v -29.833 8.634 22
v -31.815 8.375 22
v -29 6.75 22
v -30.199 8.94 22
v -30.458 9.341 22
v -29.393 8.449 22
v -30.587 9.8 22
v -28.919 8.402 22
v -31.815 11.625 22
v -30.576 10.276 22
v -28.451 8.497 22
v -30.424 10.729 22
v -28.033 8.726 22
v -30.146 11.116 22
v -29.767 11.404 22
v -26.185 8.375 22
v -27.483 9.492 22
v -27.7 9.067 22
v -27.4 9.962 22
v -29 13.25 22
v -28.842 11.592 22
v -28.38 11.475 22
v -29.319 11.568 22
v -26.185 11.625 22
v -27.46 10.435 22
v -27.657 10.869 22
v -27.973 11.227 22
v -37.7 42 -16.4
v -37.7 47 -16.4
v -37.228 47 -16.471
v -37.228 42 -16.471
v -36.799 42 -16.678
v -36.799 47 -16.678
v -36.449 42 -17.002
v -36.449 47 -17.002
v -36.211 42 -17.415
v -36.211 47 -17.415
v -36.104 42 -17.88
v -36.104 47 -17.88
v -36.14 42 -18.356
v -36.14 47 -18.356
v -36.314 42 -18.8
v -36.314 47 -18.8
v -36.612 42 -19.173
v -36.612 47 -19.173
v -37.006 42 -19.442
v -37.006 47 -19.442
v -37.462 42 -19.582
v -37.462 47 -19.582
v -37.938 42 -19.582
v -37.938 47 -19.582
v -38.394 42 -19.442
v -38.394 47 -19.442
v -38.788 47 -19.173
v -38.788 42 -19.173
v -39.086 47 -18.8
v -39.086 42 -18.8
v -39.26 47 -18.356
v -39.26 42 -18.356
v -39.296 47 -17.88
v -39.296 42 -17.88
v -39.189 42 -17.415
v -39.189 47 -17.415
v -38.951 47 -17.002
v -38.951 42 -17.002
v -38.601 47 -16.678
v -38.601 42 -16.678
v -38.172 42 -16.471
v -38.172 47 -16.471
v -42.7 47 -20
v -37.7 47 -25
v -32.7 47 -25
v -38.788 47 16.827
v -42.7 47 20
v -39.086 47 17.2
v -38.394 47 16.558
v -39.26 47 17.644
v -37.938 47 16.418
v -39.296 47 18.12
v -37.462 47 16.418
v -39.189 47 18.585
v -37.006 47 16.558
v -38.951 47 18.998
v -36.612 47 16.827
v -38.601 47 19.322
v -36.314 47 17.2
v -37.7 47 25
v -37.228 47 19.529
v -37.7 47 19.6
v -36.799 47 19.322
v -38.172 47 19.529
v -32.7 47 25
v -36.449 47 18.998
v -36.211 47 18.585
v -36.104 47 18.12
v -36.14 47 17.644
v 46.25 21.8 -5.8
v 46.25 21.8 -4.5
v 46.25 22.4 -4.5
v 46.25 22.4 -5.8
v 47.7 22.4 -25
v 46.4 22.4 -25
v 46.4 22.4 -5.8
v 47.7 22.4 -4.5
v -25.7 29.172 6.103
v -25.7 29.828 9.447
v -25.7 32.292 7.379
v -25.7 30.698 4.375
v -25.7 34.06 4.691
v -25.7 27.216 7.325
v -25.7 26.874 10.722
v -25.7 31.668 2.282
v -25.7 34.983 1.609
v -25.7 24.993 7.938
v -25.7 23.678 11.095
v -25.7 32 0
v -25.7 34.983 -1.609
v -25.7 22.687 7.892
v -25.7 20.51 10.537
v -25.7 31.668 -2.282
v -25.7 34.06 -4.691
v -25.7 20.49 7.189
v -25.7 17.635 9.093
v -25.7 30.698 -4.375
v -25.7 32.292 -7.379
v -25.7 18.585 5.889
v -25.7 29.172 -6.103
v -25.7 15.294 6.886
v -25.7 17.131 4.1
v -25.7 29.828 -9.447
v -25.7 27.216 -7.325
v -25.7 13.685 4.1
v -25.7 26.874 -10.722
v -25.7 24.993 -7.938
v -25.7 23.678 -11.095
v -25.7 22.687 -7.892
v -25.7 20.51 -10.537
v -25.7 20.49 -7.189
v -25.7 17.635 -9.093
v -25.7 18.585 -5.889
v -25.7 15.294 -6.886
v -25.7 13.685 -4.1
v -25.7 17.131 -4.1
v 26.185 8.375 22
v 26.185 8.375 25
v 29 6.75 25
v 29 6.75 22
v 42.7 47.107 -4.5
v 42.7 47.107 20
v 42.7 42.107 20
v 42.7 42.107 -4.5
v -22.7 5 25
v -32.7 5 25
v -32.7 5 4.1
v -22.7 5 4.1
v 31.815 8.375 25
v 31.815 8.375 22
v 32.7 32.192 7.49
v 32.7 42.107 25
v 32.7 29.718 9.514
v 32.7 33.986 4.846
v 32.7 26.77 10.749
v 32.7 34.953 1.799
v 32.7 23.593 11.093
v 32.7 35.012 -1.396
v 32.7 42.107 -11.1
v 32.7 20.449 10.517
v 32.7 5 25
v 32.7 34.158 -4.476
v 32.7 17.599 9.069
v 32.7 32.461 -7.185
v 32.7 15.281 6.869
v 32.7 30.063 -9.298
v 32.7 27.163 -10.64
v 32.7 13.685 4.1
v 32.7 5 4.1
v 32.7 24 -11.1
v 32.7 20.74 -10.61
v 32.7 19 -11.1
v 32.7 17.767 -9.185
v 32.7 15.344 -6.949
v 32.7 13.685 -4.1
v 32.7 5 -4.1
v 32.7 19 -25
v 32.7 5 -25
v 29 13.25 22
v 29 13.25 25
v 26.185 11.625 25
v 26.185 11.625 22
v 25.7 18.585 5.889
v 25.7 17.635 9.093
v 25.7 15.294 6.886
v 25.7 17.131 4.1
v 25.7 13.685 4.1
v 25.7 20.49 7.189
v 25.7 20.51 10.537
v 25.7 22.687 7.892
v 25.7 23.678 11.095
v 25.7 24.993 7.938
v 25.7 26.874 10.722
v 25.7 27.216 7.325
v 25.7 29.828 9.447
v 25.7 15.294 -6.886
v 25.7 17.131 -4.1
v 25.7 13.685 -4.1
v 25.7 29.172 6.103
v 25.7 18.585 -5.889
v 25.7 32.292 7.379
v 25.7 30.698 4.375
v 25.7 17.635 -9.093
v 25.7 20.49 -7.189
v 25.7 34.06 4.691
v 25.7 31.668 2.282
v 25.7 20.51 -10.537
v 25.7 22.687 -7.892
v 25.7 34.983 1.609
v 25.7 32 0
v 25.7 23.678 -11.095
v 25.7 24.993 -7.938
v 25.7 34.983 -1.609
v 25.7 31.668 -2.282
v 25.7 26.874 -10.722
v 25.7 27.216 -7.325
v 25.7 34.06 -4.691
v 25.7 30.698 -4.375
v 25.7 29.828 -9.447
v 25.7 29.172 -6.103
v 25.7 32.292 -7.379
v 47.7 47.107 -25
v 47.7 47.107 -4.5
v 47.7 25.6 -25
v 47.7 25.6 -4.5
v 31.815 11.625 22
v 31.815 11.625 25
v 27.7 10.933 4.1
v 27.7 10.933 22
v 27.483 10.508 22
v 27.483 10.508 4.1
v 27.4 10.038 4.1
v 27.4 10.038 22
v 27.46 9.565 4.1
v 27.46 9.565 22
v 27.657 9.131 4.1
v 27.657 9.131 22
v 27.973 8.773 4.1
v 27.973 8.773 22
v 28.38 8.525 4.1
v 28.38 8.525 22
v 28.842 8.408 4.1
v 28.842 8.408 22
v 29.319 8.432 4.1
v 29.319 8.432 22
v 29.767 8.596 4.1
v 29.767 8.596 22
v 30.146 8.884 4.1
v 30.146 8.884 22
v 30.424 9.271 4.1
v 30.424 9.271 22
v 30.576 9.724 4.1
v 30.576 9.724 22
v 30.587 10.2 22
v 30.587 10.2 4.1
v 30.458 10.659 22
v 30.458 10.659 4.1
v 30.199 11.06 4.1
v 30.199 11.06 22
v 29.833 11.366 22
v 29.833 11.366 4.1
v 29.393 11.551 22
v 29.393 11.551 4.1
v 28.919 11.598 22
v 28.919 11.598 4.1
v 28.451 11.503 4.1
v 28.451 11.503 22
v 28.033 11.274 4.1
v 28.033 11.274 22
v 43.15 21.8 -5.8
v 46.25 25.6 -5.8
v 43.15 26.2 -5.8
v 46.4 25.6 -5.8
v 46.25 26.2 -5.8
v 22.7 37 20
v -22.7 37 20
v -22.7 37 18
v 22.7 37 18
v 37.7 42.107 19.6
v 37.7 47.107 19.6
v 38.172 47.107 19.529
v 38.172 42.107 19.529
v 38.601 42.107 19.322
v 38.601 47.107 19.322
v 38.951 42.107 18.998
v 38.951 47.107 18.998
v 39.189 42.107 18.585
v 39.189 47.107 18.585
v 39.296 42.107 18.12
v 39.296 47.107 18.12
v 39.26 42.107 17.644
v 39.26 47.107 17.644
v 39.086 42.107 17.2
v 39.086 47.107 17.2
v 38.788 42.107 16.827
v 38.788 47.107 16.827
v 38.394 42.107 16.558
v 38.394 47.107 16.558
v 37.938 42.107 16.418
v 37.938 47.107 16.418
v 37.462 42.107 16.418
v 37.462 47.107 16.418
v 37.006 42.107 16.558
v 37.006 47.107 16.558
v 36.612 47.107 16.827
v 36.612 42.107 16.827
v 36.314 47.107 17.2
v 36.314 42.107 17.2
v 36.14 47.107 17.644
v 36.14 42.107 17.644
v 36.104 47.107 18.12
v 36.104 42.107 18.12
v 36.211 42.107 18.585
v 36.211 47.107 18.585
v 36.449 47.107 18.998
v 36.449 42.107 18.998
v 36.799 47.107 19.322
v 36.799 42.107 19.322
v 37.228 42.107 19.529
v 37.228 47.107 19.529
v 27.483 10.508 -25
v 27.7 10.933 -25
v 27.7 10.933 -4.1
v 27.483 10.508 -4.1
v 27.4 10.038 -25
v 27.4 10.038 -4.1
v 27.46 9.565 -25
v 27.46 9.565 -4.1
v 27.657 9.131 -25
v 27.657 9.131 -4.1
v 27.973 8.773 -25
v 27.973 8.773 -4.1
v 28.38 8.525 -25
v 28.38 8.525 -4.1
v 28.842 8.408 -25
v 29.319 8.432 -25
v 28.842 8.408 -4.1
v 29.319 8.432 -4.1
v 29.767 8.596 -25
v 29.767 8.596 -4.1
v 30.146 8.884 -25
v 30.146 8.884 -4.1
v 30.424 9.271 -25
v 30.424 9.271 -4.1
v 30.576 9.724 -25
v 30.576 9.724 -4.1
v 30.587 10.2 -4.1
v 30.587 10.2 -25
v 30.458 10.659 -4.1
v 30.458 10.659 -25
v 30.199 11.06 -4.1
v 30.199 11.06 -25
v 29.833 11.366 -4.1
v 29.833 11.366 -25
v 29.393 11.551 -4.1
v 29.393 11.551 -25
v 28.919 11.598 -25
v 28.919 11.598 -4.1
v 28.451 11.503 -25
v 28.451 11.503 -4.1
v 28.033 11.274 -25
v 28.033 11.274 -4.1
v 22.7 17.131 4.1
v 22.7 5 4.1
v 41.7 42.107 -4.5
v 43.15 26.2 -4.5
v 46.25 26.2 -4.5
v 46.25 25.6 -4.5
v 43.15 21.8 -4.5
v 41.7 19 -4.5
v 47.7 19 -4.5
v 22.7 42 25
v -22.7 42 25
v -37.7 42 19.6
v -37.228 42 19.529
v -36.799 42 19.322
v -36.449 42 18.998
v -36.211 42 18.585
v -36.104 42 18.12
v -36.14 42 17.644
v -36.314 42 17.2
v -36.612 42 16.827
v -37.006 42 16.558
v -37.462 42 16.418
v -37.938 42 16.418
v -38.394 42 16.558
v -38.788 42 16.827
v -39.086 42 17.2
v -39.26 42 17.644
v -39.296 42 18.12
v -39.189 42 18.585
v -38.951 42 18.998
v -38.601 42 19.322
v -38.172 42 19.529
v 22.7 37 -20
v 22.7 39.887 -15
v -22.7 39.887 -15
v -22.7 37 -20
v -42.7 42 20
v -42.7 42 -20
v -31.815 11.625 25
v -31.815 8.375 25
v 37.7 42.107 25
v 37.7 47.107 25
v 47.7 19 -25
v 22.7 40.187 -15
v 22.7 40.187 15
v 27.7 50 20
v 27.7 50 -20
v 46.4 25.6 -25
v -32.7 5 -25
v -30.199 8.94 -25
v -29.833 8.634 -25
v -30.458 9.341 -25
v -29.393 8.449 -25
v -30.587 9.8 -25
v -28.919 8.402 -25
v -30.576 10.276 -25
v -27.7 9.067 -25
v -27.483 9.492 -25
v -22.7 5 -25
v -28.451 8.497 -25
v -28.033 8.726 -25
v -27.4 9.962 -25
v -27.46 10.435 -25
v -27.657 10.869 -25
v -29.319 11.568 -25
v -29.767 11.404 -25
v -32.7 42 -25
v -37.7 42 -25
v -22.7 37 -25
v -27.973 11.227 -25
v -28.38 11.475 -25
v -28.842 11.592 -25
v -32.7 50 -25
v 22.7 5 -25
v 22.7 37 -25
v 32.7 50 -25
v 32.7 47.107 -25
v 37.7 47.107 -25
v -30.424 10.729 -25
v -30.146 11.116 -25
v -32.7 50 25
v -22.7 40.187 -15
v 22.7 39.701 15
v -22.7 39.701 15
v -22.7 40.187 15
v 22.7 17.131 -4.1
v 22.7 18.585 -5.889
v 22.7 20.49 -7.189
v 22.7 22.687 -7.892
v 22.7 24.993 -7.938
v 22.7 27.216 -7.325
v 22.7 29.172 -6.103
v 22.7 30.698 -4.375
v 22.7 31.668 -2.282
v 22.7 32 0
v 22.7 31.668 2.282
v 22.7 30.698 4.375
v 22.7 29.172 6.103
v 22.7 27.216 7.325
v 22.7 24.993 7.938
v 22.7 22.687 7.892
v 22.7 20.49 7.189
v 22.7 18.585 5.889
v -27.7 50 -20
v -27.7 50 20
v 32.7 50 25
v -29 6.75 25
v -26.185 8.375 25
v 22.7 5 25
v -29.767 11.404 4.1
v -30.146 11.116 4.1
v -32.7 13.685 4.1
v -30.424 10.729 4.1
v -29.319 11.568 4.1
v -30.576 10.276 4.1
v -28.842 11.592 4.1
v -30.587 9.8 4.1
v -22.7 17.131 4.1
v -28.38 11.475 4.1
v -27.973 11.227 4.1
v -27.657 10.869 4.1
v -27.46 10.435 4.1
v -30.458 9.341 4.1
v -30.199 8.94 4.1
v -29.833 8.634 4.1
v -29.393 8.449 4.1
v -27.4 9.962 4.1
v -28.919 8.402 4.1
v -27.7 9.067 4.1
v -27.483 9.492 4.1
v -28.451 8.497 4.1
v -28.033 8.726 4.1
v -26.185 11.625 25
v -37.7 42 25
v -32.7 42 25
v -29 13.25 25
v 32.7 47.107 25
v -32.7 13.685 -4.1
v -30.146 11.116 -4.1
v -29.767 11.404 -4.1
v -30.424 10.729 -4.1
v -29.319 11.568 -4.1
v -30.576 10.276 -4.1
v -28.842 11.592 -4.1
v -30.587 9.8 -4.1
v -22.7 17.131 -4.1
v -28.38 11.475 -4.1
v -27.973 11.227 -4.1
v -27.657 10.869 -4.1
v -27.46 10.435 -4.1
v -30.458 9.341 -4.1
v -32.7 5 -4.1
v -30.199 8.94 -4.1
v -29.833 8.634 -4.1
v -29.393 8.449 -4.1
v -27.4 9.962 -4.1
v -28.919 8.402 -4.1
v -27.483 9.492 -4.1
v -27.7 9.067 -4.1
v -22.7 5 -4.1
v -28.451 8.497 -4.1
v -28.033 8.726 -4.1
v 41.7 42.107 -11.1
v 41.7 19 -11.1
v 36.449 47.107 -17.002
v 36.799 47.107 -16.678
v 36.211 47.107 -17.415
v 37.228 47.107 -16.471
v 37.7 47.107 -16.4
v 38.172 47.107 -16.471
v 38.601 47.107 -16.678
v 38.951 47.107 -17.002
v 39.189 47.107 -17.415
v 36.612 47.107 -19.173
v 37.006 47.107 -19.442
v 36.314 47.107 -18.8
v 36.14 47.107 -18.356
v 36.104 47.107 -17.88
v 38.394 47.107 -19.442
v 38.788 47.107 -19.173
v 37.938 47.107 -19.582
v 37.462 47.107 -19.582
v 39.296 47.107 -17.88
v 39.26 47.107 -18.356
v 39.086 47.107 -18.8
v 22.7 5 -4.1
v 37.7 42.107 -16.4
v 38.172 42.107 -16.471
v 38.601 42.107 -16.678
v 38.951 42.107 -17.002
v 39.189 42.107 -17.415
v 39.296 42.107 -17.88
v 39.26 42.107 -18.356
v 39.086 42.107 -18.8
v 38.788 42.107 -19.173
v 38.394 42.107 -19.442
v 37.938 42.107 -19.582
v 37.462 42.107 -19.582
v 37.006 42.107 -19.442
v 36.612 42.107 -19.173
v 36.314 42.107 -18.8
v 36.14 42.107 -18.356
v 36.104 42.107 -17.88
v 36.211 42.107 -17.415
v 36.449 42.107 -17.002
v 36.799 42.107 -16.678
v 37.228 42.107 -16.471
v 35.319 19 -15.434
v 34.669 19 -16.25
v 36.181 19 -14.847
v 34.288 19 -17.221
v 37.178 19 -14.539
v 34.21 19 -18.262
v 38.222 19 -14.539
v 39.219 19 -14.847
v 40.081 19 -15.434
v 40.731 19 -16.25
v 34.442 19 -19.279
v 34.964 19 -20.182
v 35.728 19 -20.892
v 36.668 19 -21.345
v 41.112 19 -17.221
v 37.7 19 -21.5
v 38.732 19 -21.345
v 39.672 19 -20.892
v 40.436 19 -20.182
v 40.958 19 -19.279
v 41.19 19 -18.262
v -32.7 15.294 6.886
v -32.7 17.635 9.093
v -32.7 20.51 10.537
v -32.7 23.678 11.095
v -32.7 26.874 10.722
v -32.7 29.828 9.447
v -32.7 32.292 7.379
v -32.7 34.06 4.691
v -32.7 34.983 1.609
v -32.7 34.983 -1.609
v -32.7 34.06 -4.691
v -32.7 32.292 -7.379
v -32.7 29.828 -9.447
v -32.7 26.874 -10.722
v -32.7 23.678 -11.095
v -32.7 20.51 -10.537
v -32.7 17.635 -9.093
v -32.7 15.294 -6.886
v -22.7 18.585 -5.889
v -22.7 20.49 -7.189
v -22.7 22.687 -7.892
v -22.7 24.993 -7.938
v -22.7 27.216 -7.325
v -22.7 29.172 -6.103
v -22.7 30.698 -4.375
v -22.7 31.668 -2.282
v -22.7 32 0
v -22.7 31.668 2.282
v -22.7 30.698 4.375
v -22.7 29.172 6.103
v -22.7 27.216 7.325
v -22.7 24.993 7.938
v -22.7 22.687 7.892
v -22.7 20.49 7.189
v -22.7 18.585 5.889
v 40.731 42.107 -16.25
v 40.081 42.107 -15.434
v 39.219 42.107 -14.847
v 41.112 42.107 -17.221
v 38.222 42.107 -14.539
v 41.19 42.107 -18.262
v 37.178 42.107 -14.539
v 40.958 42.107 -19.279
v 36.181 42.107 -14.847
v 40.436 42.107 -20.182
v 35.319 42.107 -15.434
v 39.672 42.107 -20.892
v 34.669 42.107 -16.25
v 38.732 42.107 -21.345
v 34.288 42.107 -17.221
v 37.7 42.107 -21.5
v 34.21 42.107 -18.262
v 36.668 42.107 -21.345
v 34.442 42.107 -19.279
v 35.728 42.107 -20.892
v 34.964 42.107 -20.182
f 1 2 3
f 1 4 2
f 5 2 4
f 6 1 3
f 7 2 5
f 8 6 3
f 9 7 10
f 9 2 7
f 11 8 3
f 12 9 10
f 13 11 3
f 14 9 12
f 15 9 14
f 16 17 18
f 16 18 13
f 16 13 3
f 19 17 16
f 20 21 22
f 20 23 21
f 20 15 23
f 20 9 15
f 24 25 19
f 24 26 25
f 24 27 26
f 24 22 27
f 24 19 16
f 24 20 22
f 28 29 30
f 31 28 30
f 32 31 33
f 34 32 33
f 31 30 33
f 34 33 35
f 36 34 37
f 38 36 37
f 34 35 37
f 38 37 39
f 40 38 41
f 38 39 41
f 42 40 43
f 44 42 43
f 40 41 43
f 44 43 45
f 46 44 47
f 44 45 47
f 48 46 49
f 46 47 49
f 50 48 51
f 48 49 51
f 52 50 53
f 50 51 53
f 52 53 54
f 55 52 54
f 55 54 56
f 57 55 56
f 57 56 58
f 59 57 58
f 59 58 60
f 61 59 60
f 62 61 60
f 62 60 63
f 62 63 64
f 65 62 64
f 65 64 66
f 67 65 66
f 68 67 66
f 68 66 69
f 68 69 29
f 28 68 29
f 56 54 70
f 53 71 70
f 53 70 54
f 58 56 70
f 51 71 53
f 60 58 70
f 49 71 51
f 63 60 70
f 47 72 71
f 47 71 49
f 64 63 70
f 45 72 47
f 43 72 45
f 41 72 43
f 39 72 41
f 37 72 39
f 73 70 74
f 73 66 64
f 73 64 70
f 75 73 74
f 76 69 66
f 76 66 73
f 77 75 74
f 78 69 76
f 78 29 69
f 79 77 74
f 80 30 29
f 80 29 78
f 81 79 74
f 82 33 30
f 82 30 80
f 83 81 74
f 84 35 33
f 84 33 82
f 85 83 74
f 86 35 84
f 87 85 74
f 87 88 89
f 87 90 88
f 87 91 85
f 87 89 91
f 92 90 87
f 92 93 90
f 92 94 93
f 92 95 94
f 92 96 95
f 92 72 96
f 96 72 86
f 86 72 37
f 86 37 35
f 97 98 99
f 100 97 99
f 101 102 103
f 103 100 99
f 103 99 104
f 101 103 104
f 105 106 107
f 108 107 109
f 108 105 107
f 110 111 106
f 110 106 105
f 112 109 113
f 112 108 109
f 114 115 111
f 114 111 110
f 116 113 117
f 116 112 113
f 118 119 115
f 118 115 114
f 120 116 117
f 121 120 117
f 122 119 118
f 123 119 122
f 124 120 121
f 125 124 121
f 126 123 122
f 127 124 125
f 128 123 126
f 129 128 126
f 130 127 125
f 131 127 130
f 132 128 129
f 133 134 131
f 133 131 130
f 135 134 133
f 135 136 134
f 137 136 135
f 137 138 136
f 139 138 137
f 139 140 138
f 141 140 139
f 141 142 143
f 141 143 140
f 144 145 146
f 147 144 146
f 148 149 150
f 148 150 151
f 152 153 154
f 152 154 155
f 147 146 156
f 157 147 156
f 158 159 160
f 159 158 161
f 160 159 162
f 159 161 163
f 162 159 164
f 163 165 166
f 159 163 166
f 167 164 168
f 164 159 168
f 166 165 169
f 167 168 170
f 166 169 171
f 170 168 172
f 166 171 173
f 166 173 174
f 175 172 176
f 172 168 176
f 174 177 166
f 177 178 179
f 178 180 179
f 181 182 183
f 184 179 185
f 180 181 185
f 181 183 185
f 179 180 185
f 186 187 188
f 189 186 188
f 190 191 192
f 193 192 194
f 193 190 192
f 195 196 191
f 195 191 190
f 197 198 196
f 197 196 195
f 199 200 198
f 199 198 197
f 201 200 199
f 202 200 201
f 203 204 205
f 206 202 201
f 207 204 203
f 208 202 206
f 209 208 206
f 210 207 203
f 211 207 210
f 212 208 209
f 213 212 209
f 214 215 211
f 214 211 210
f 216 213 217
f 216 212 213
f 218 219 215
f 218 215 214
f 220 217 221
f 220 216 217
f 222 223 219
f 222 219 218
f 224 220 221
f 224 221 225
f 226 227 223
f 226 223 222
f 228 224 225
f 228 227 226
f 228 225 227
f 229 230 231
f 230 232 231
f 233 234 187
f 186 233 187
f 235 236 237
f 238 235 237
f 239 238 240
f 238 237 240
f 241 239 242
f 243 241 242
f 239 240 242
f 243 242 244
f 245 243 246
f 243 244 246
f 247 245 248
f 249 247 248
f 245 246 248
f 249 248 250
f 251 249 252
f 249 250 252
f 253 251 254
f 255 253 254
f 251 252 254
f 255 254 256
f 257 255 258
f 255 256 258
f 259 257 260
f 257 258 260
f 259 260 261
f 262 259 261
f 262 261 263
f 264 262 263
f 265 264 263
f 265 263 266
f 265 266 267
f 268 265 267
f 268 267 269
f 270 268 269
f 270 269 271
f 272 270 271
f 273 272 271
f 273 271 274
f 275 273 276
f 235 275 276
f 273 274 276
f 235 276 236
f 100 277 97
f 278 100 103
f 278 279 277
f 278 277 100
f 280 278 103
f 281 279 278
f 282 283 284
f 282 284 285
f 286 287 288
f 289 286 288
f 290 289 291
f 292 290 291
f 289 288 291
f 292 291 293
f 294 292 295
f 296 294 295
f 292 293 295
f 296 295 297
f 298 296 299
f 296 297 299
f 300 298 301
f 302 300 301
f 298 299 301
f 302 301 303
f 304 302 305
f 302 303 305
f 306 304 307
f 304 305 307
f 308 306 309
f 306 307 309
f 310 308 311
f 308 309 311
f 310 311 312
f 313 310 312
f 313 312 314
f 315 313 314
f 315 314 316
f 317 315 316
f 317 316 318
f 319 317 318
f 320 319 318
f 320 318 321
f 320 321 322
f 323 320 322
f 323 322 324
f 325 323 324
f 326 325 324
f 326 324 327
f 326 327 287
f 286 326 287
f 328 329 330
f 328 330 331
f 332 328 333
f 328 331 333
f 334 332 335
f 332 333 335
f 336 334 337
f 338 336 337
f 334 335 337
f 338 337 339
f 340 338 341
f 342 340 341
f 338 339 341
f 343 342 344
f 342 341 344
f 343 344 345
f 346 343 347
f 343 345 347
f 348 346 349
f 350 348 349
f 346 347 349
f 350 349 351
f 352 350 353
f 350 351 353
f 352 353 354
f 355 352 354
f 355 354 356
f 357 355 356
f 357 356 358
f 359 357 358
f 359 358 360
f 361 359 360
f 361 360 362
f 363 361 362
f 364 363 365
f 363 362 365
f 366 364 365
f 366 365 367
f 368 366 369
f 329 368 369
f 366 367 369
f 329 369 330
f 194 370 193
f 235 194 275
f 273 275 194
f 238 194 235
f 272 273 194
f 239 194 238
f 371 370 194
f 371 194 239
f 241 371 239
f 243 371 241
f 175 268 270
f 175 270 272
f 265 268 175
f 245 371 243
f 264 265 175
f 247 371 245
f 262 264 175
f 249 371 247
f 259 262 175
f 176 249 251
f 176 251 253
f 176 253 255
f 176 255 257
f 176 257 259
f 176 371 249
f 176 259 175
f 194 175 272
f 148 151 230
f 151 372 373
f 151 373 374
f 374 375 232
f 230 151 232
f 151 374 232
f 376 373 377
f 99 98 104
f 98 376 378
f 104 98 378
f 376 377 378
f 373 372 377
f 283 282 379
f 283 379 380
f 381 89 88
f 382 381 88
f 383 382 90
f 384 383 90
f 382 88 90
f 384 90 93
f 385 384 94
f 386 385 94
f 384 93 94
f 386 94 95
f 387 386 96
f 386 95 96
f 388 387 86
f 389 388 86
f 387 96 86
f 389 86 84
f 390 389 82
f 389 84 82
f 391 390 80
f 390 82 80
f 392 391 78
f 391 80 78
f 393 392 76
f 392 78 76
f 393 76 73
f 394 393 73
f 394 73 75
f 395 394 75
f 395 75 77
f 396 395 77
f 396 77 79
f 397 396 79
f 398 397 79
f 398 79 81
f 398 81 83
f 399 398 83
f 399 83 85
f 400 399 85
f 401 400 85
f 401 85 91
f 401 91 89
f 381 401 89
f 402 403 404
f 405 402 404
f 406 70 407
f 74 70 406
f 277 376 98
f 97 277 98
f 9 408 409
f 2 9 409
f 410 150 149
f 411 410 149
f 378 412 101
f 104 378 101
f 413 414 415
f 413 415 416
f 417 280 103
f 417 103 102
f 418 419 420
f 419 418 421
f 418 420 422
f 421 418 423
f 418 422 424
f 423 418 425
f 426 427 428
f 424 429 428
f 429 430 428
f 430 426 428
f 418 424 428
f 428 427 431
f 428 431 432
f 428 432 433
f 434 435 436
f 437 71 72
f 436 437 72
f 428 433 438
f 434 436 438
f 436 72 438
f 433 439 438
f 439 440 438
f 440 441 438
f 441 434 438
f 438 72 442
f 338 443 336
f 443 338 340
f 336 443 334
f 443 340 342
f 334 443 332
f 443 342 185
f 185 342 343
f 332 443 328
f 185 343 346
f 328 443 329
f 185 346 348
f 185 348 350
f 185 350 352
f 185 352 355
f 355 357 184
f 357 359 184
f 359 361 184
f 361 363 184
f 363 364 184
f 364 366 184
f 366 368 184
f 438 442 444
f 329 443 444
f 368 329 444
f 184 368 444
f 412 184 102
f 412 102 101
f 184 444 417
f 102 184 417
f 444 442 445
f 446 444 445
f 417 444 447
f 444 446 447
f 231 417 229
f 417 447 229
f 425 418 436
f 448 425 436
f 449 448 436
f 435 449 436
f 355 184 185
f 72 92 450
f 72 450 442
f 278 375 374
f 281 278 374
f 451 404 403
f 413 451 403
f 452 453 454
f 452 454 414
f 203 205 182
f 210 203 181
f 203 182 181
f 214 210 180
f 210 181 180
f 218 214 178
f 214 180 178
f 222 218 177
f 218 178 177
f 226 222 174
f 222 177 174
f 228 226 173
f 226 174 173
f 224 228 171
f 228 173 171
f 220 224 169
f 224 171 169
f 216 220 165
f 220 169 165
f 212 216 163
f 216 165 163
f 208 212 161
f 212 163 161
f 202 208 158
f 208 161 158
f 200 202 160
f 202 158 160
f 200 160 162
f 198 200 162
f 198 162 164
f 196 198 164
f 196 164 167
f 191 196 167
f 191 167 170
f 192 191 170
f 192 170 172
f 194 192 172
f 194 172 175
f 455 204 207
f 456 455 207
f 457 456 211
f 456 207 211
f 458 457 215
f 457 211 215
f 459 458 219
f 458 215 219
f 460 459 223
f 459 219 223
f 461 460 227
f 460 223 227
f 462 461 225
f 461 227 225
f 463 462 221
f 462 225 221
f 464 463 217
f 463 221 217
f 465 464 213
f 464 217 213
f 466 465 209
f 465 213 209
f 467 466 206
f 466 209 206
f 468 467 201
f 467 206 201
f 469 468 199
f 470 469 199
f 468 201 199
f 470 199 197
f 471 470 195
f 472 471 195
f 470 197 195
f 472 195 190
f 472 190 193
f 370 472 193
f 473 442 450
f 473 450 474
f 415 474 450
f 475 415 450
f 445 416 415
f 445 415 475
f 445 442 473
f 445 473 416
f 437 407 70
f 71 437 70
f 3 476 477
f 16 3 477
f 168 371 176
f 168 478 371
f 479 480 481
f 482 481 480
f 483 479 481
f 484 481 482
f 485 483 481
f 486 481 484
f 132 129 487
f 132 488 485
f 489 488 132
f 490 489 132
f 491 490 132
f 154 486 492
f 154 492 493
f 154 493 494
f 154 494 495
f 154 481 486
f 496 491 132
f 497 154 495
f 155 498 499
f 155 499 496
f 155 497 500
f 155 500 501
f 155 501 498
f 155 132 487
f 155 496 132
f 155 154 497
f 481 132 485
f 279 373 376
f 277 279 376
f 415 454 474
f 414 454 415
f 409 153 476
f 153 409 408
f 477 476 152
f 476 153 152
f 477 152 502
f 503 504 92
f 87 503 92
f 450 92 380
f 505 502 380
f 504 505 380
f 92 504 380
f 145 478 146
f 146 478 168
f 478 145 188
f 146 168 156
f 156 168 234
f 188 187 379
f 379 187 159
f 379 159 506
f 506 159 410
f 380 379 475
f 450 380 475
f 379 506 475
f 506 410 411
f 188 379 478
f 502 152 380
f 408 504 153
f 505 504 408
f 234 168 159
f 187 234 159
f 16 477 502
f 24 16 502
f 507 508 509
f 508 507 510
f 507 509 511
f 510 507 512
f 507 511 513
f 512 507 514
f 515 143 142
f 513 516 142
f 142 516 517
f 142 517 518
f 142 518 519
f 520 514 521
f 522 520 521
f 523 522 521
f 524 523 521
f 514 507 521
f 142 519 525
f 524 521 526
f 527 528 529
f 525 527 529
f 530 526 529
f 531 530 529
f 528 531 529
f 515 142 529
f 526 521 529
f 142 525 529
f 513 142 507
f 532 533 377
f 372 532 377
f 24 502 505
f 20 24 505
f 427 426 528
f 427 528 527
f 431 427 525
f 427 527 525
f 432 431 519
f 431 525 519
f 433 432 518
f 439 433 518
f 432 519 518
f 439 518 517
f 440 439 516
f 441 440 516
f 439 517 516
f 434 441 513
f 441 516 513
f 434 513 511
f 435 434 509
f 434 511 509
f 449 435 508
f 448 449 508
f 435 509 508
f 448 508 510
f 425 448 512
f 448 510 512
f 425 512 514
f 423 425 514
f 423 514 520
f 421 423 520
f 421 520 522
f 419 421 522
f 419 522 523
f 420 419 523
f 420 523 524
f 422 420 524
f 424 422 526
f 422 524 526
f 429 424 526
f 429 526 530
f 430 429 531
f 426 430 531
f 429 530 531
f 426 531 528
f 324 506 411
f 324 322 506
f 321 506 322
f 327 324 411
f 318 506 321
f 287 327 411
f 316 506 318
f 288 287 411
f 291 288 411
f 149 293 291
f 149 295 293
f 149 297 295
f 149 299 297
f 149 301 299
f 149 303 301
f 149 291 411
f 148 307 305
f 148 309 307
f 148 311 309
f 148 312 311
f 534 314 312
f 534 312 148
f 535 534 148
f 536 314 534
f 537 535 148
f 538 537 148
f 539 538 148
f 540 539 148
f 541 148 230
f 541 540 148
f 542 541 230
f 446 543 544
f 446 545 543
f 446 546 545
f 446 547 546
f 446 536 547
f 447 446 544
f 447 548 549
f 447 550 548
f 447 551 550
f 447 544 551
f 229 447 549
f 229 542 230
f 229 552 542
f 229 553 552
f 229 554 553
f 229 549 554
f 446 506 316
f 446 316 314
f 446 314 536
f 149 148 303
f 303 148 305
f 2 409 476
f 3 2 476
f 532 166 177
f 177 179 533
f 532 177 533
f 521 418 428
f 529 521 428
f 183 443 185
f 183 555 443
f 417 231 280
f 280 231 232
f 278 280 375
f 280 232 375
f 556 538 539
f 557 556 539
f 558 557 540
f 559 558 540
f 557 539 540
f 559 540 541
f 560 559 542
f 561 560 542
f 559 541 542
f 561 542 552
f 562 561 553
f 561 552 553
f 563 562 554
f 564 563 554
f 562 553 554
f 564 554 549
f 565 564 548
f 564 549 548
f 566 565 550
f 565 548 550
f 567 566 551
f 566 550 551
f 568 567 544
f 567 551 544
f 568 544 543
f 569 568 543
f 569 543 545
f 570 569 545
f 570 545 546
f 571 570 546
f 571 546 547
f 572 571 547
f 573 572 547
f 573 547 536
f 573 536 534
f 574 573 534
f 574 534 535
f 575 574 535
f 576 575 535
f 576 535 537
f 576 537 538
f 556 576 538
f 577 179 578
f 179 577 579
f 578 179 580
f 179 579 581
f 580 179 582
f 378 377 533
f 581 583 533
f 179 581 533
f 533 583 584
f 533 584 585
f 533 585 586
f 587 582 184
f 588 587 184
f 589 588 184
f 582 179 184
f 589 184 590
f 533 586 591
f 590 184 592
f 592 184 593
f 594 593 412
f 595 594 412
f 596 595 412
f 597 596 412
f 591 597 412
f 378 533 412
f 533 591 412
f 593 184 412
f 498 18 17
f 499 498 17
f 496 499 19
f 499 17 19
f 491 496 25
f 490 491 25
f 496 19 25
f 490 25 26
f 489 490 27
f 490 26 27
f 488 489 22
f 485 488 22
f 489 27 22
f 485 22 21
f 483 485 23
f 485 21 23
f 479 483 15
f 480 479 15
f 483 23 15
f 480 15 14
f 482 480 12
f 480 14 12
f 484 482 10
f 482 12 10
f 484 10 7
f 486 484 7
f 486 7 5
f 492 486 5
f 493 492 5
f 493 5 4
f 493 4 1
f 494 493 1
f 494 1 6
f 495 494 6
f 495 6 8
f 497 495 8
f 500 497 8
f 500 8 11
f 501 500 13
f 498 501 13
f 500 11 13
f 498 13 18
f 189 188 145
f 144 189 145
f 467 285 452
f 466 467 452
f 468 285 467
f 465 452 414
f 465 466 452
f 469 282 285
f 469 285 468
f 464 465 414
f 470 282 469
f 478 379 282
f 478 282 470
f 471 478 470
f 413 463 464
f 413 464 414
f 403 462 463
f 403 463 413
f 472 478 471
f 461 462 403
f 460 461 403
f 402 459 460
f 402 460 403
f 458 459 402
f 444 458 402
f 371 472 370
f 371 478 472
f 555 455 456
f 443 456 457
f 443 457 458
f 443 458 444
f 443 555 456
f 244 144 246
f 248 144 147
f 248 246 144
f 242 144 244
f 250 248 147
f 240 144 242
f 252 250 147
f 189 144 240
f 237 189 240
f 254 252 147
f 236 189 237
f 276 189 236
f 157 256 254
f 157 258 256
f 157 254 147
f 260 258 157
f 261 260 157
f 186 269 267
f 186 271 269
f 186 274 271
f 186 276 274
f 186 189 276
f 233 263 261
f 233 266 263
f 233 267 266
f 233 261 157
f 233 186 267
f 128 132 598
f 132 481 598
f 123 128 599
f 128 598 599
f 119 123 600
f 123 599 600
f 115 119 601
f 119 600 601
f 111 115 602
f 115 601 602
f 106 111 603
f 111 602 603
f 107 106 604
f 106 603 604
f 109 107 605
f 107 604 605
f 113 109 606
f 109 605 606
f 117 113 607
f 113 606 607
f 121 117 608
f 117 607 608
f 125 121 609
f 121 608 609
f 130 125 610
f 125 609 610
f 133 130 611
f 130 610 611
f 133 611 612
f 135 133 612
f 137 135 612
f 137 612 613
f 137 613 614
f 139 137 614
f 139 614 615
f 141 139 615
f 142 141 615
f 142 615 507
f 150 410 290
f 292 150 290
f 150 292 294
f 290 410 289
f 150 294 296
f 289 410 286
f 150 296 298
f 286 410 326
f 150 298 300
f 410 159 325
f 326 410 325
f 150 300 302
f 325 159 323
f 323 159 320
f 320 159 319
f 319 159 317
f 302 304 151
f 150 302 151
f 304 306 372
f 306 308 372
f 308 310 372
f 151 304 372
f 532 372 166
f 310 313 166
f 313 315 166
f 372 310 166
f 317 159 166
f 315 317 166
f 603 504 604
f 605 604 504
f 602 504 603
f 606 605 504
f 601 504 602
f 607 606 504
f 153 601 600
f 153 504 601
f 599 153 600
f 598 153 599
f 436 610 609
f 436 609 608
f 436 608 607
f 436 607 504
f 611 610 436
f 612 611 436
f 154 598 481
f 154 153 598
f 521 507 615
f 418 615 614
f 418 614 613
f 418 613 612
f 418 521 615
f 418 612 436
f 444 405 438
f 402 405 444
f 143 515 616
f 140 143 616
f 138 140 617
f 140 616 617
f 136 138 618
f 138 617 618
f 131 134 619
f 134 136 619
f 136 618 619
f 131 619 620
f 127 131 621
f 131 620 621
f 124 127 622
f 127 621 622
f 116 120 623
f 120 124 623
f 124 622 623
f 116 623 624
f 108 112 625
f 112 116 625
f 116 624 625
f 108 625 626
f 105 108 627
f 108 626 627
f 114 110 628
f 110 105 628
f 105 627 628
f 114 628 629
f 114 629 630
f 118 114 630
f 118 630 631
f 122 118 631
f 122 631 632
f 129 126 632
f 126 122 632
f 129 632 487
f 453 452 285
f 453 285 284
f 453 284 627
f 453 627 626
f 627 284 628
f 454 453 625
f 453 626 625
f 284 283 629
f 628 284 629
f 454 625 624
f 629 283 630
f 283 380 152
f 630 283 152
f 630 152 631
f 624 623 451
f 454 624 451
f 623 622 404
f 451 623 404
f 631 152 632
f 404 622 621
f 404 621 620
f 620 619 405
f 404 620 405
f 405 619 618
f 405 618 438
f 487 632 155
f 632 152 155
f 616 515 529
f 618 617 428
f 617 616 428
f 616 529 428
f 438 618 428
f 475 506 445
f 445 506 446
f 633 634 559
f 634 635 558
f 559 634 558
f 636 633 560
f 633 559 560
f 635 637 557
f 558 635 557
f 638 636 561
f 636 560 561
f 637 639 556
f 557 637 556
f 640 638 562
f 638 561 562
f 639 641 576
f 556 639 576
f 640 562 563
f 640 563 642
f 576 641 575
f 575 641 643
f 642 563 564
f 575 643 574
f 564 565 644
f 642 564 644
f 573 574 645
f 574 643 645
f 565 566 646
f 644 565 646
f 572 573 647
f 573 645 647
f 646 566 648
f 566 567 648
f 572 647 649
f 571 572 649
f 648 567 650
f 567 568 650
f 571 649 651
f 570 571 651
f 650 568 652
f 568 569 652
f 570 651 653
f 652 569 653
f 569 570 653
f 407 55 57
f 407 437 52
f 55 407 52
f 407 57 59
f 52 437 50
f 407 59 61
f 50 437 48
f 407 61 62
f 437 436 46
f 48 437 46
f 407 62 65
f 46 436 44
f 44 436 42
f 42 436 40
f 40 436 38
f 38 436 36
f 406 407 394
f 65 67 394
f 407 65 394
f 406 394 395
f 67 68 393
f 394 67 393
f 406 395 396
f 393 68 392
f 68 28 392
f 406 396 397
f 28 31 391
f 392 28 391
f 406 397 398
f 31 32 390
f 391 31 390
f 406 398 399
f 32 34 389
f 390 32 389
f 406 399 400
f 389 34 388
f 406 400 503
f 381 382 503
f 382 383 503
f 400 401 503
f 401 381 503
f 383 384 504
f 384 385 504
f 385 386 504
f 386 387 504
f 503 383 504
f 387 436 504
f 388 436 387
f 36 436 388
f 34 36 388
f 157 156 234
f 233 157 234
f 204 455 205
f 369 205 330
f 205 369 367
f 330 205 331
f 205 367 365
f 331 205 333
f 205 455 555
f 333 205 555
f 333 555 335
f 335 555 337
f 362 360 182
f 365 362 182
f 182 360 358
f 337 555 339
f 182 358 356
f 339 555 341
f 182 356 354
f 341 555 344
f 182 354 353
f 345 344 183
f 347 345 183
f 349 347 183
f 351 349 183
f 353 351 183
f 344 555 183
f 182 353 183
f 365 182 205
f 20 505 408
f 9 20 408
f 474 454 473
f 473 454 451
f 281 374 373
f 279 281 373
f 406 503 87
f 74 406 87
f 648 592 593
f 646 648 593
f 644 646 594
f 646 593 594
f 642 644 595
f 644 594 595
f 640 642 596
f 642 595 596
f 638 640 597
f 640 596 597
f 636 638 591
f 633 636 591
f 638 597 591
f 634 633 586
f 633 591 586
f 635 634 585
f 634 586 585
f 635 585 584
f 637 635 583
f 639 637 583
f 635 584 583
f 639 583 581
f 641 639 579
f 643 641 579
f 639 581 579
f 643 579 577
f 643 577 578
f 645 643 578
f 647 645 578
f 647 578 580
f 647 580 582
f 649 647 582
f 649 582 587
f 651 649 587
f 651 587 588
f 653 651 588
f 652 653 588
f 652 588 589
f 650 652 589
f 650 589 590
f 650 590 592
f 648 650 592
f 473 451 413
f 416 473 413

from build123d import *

# Parameters (mm, degrees)
SKETCH1_W           = 65.4
SKETCH1_H           = 60
SKETCH1_W_2         = 45.4
SKETCH1_H_2         = 30
BOSS_EXTRUDE1_DEPTH = 40
SKETCH2_R           = 8
CUT_EXTRUDE1_DEPTH  = 66.4
SKETCH3_W           = 45.4
SKETCH3_H           = 52
CUT_EXTRUDE2_DEPTH  = 37
CHAMFER1_SIZE       = 5
CHAMFER1_SIZE2      = 2.886751346
SKETCH7_W           = 65.4
SKETCH7_H           = 5
CUT_EXTRUDE5_DEPTH  = 41
CHAMFER2_SIZE       = 3
CHAMFER2_SIZE2      = 2.701212133
SKETCH8_W           = 65.4
SKETCH8_H           = 55
SKETCH8_W_2         = 45.4
SKETCH8_H_2         = 30
BOSS_EXTRUDE2_DEPTH = 10
CHAMFER3_SIZE       = 5
CHAMFER3_SIZE2      = 9.813052528
SKETCH10_R          = 11.1
CUT_EXTRUDE8_DEPTH  = 7
SKETCH11_R          = 11.1
CUT_EXTRUDE9_DEPTH  = 7
SKETCH12_W          = 65.4
SKETCH12_H          = 8.2
CUT_EXTRUDE10_DEPTH = 20
SKETCH13_W          = 65.4
SKETCH13_H          = 5
CUT_EXTRUDE11_DEPTH = 3
CHAMFER4_SIZE       = 5
SKETCH20_W          = 50
SKETCH20_H          = 5
BOSS_EXTRUDE5_DEPTH = 10
SKETCH21_W          = 50
SKETCH21_H          = 5
BOSS_EXTRUDE6_DEPTH = 10
CHAMFER5_SIZE       = 5
SKETCH23_R          = 1.6
CUT_EXTRUDE15_DEPTH = 48
SKETCH24_W          = 13.9
SKETCH24_H          = 10
BOSS_EXTRUDE7_DEPTH = 15
SKETCH22_R          = 1.6
CUT_EXTRUDE14_DEPTH = 48.107149008
SKETCH25_R          = 3.5
CUT_EXTRUDE16_DEPTH = 10
SKETCH27_W          = 6
SKETCH27_H          = 10
BOSS_EXTRUDE8_DEPTH = 6.6
CUT_EXTRUDE18_DEPTH = 1.3
SKETCH29_W          = 19.2
SKETCH29_H          = 3.2
CUT_EXTRUDE19_DEPTH = 1.3
SKETCH30_R          = 1.6
CUT_EXTRUDE20_DEPTH = 56
CUT_EXTRUDE21_DEPTH = 3
SKETCH32_R          = 3.15
CUT_EXTRUDE22_DEPTH = 5
SKETCH35_W          = 105.7739029
SKETCH35_H          = 101.810214422
CUT_EXTRUDE23_DEPTH = 5
CHAMFER6_SIZE       = 5
CUT_EXTRUDE25_DEPTH = 43
SKETCH37_R          = 3.5
BOSS_EXTRUDE9_DEPTH = 18.107149


with BuildPart() as part:
    # Sketch1 → Boss-Extrude1 (new body)
    with BuildSketch(Plane(origin=(0, 0, 0), x_dir=(1, 0, 0), z_dir=(0, 1, 0))):
        Rectangle(SKETCH1_W, SKETCH1_H)
        Rectangle(SKETCH1_W_2, SKETCH1_H_2, mode=Mode.SUBTRACT)
    extrude(amount=BOSS_EXTRUDE1_DEPTH)

    # Sketch2 → Cut-Extrude1 (cut, through all)
    with BuildSketch(Plane(origin=(32.7, 0, 0), x_dir=(0, 0, -1), z_dir=(1, 0, 0))):
        with Locations((0, 24)):
            Circle(SKETCH2_R)
    extrude(amount=-CUT_EXTRUDE1_DEPTH, mode=Mode.SUBTRACT)

    # Sketch3 → Cut-Extrude2 (cut)
    with BuildSketch(Plane.XZ):
        Rectangle(SKETCH3_W, SKETCH3_H)
    extrude(amount=-CUT_EXTRUDE2_DEPTH, mode=Mode.SUBTRACT)

    # Chamfer1
    chamfer1_edges = [part.edges().sort_by_distance(p)[0] for p in [
        (0, 37, -15),
    ]]
    chamfer1_side = [part.faces().sort_by_distance(p)[0] for p in [
        (0, 37, -20.5),
    ]]
    chamfer(chamfer1_edges, length=CHAMFER1_SIZE, length2=CHAMFER1_SIZE2, reference=chamfer1_side[0])

    # Sketch7 → Cut-Extrude5 (cut, through all)
    with BuildSketch(Plane(origin=(0, 40, 0), x_dir=(1, 0, 0), z_dir=(0, 1, 0))):
        with Locations((0, -27.5)):
            Rectangle(SKETCH7_W, SKETCH7_H)
    extrude(amount=-CUT_EXTRUDE5_DEPTH, mode=Mode.SUBTRACT)

    # Chamfer2
    chamfer2_edges = [part.edges().sort_by_distance(p)[0] for p in [
        (0, 37, 15),
    ]]
    chamfer2_side = [part.faces().sort_by_distance(p)[0] for p in [
        (0, 37, 20),
    ]]
    chamfer(chamfer2_edges, length=CHAMFER2_SIZE, length2=CHAMFER2_SIZE2, reference=chamfer2_side[0])

    # Sketch8 → Boss-Extrude2 (add)
    with BuildSketch(Plane(origin=(0, 40, 0), x_dir=(1, 0, 0), z_dir=(0, 1, 0))):
        with Locations((0, 2.5)):
            Rectangle(SKETCH8_W, SKETCH8_H)
        Rectangle(SKETCH8_W_2, SKETCH8_H_2, mode=Mode.SUBTRACT)
    extrude(amount=BOSS_EXTRUDE2_DEPTH)

    # Chamfer3
    chamfer3_edges = [part.edges().sort_by_distance(p)[0] for p in [
        (-22.7, 50, 0),
        (0, 50, 15),
        (22.7, 50, 0),
        (0, 50, -15),
    ]]
    chamfer3_side = [part.faces().sort_by_distance(p)[0] for p in [
        (0, 50, 24.14547323),
    ]]
    chamfer(chamfer3_edges, length=CHAMFER3_SIZE, length2=CHAMFER3_SIZE2, reference=chamfer3_side[0])

    # Sketch10 → Cut-Extrude8 (cut)
    with BuildSketch(Plane(origin=(32.7, 0, 0), x_dir=(0, 0, -1), z_dir=(1, 0, 0))):
        with Locations((0, 24)):
            Circle(SKETCH10_R)
    extrude(amount=-CUT_EXTRUDE8_DEPTH, mode=Mode.SUBTRACT)

    # Sketch11 → Cut-Extrude9 (cut)
    with BuildSketch(Plane.ZY.offset(32.7)):
        with Locations(Location((0, 24, 0), (0, 0, 180))):  # turned: the seam where the file's is
            Circle(SKETCH11_R)
    extrude(amount=-CUT_EXTRUDE9_DEPTH, mode=Mode.SUBTRACT)

    # Sketch12 → Cut-Extrude10 (cut)
    with BuildSketch(Plane.XZ):
        Rectangle(SKETCH12_W, SKETCH12_H)
    extrude(amount=-CUT_EXTRUDE10_DEPTH, mode=Mode.SUBTRACT)

    # Sketch13 → Cut-Extrude11 (cut)
    with BuildSketch(Plane(origin=(0, 50, 0), x_dir=(1, 0, 0), z_dir=(0, 1, 0))):
        with Locations((0, 27.5)):
            Rectangle(SKETCH13_W, SKETCH13_H)
    extrude(amount=-CUT_EXTRUDE11_DEPTH, mode=Mode.SUBTRACT)

    # Chamfer4
    chamfer4_edges = [part.edges().sort_by_distance(p)[0] for p in [
        (-32.7, 23.5, -30),
        (32.7, 23.5, -30),
    ]]
    chamfer(chamfer4_edges, length=CHAMFER4_SIZE)

    # Sketch20 → Boss-Extrude5 (add)
    with BuildSketch(Plane(origin=(32.7, 0, 0), x_dir=(0, 0, -1), z_dir=(1, 0, 0))):
        with Locations((0, 44.607149008)):
            Rectangle(SKETCH20_W, SKETCH20_H)
    extrude(amount=BOSS_EXTRUDE5_DEPTH)

    # Sketch21 → Boss-Extrude6 (add)
    with BuildSketch(Plane.ZY.offset(32.7)):
        with Locations((0, 44.5)):
            Rectangle(SKETCH21_W, SKETCH21_H)
    extrude(amount=BOSS_EXTRUDE6_DEPTH)

    # Chamfer5
    chamfer5_edges = [part.edges().sort_by_distance(p)[0] for p in [
        (42.7, 44.607149008, 25),
        (42.7, 44.607149008, -25),
        (-42.7, 44.5, -25),
        (-42.7, 44.5, 25),
    ]]
    chamfer(chamfer5_edges, length=CHAMFER5_SIZE)

    # Sketch23 → Cut-Extrude15 (cut, through all)
    with BuildSketch(Plane(origin=(0, 47, 0), x_dir=(1, 0, 0), z_dir=(0, 1, 0))):
        with Locations(Location((-37.7, 18, 0), (0, 0, 270))):  # turned: the seam where the file's is
            Circle(SKETCH23_R)
        with Locations(Location((-37.7, -18, 0), (0, 0, 270))):  # turned: the seam where the file's is
            Circle(SKETCH23_R)
    extrude(amount=-CUT_EXTRUDE15_DEPTH, mode=Mode.SUBTRACT)

    # Sketch24 → Boss-Extrude7 (add)
    with BuildSketch(Plane(origin=(32.7, 0, 0), x_dir=(0, 0, -1), z_dir=(1, 0, 0))):
        with Locations((18.05, 24)):
            Rectangle(SKETCH24_W, SKETCH24_H)
    extrude(amount=BOSS_EXTRUDE7_DEPTH)

    # Sketch22 → Cut-Extrude14 (cut, through all)
    with BuildSketch(Plane(origin=(0, 47.107149008, 0), x_dir=(1, 0, 0), z_dir=(0, 1, 0))):
        with Locations(Location((37.7, -18, 0), (0, 0, 270))):  # turned: the seam where the file's is
            Circle(SKETCH22_R)
        with Locations(Location((37.7, 18, 0), (0, 0, 270))):  # turned: the seam where the file's is
            Circle(SKETCH22_R)
    extrude(amount=-CUT_EXTRUDE14_DEPTH, mode=Mode.SUBTRACT)

    # Sketch25 → Cut-Extrude16 (cut)
    with BuildSketch(Plane.XZ.offset(-19)):
        with Locations(Location((37.7, -18, 0), (0, 0, 270))):  # turned: the seam where the file's is
            Circle(SKETCH25_R)
    extrude(amount=-CUT_EXTRUDE16_DEPTH, mode=Mode.SUBTRACT)

    # Sketch27 → Boss-Extrude8 (add)
    with BuildSketch(Plane.XY.offset(-11.1)):
        with Locations((44.7, 24)):
            Rectangle(SKETCH27_W, SKETCH27_H)
    extrude(amount=BOSS_EXTRUDE8_DEPTH)

    # Sketch28 → Cut-Extrude18 (cut)
    with BuildSketch(Plane.XY.offset(-4.5)):
        Polygon((46.25, 21.8), (46.25, 22.4), (47.7, 22.4), (47.7, 25.6), (46.25, 25.6), (46.25, 26.2), (43.15, 26.2), (43.15, 21.8), align=None)
    extrude(amount=-CUT_EXTRUDE18_DEPTH, mode=Mode.SUBTRACT)

    # Sketch29 → Cut-Extrude19 (cut)
    with BuildSketch(Plane(origin=(47.7, 0, 0), x_dir=(0, 0, -1), z_dir=(1, 0, 0))):
        with Locations((15.4, 24)):
            Rectangle(SKETCH29_W, SKETCH29_H)
    extrude(amount=-CUT_EXTRUDE19_DEPTH, mode=Mode.SUBTRACT)

    # Sketch30 → Cut-Extrude20 (cut, through all)
    with BuildSketch(Plane.XY.offset(25)):
        with Locations(Location((-29, 10, 0), (0, 0, 324.340912304))):  # turned: the seam where the file's is
            Circle(SKETCH30_R)
        with Locations(Location((29, 10, 0), (0, 0, 144.340912304))):  # turned: the seam where the file's is
            Circle(SKETCH30_R)
    extrude(amount=-CUT_EXTRUDE20_DEPTH, mode=Mode.SUBTRACT)

    # Sketch31 → Cut-Extrude21 (cut)
    with BuildSketch(Plane.XY.offset(25)):
        Polygon((26.185417438, 11.625), (26.185417438, 8.375), (29, 6.75), (31.814582562, 8.375), (31.814582562, 11.625), (29, 13.25), align=None)
        Polygon((-31.814582562, 11.625), (-31.814582562, 8.375), (-29, 6.75), (-26.185417438, 8.375), (-26.185417438, 11.625), (-29, 13.25), align=None)
    extrude(amount=-CUT_EXTRUDE21_DEPTH, mode=Mode.SUBTRACT)

    # Sketch32 → Cut-Extrude22 (cut)
    with BuildSketch(Plane(origin=(0, 0, -30), x_dir=(-1, 0, 0), z_dir=(0, 0, -1))):
        with Locations((-29, 10)):
            Circle(SKETCH32_R)
        with Locations((29, 10)):
            Circle(SKETCH32_R)
    extrude(amount=-CUT_EXTRUDE22_DEPTH, mode=Mode.SUBTRACT)

    # Sketch35 → Cut-Extrude23 (cut)
    with BuildSketch(Plane.XZ):
        Rectangle(SKETCH35_W, SKETCH35_H)
    extrude(amount=-CUT_EXTRUDE23_DEPTH, mode=Mode.SUBTRACT)

    # Chamfer6
    chamfer6_edges = [part.edges().sort_by_distance(p)[0] for p in [
        (0, 37, 25),
    ]]
    chamfer(chamfer6_edges, length=CHAMFER6_SIZE)

    # Sketch36 → Cut-Extrude25 (cut, through all)
    with BuildSketch(Plane(origin=(0, 47, 0), x_dir=(1, 0, 0), z_dir=(0, 1, 0))):
        Polygon((32.7, 25), (27.7, 30), (-27.7, 30), (-32.7, 25), align=None)
    extrude(amount=-CUT_EXTRUDE25_DEPTH, mode=Mode.SUBTRACT)

    # Sketch37 → Boss-Extrude9 (add)
    with BuildSketch(Plane(origin=(0, 29, 0), x_dir=(1, 0, 0), z_dir=(0, 1, 0))):
        Polygon((32.7, 11.1), (41.7, 11.1), (41.7, 4.5), (47.7, 4.5), (47.7, 25), (32.7, 25), align=None)
        with Locations(Location((37.7, 18, 0), (0, 0, 90))):  # turned: the seam where the file's is
            Circle(SKETCH37_R, mode=Mode.SUBTRACT)
    extrude(amount=BOSS_EXTRUDE9_DEPTH)


solid = part.part
